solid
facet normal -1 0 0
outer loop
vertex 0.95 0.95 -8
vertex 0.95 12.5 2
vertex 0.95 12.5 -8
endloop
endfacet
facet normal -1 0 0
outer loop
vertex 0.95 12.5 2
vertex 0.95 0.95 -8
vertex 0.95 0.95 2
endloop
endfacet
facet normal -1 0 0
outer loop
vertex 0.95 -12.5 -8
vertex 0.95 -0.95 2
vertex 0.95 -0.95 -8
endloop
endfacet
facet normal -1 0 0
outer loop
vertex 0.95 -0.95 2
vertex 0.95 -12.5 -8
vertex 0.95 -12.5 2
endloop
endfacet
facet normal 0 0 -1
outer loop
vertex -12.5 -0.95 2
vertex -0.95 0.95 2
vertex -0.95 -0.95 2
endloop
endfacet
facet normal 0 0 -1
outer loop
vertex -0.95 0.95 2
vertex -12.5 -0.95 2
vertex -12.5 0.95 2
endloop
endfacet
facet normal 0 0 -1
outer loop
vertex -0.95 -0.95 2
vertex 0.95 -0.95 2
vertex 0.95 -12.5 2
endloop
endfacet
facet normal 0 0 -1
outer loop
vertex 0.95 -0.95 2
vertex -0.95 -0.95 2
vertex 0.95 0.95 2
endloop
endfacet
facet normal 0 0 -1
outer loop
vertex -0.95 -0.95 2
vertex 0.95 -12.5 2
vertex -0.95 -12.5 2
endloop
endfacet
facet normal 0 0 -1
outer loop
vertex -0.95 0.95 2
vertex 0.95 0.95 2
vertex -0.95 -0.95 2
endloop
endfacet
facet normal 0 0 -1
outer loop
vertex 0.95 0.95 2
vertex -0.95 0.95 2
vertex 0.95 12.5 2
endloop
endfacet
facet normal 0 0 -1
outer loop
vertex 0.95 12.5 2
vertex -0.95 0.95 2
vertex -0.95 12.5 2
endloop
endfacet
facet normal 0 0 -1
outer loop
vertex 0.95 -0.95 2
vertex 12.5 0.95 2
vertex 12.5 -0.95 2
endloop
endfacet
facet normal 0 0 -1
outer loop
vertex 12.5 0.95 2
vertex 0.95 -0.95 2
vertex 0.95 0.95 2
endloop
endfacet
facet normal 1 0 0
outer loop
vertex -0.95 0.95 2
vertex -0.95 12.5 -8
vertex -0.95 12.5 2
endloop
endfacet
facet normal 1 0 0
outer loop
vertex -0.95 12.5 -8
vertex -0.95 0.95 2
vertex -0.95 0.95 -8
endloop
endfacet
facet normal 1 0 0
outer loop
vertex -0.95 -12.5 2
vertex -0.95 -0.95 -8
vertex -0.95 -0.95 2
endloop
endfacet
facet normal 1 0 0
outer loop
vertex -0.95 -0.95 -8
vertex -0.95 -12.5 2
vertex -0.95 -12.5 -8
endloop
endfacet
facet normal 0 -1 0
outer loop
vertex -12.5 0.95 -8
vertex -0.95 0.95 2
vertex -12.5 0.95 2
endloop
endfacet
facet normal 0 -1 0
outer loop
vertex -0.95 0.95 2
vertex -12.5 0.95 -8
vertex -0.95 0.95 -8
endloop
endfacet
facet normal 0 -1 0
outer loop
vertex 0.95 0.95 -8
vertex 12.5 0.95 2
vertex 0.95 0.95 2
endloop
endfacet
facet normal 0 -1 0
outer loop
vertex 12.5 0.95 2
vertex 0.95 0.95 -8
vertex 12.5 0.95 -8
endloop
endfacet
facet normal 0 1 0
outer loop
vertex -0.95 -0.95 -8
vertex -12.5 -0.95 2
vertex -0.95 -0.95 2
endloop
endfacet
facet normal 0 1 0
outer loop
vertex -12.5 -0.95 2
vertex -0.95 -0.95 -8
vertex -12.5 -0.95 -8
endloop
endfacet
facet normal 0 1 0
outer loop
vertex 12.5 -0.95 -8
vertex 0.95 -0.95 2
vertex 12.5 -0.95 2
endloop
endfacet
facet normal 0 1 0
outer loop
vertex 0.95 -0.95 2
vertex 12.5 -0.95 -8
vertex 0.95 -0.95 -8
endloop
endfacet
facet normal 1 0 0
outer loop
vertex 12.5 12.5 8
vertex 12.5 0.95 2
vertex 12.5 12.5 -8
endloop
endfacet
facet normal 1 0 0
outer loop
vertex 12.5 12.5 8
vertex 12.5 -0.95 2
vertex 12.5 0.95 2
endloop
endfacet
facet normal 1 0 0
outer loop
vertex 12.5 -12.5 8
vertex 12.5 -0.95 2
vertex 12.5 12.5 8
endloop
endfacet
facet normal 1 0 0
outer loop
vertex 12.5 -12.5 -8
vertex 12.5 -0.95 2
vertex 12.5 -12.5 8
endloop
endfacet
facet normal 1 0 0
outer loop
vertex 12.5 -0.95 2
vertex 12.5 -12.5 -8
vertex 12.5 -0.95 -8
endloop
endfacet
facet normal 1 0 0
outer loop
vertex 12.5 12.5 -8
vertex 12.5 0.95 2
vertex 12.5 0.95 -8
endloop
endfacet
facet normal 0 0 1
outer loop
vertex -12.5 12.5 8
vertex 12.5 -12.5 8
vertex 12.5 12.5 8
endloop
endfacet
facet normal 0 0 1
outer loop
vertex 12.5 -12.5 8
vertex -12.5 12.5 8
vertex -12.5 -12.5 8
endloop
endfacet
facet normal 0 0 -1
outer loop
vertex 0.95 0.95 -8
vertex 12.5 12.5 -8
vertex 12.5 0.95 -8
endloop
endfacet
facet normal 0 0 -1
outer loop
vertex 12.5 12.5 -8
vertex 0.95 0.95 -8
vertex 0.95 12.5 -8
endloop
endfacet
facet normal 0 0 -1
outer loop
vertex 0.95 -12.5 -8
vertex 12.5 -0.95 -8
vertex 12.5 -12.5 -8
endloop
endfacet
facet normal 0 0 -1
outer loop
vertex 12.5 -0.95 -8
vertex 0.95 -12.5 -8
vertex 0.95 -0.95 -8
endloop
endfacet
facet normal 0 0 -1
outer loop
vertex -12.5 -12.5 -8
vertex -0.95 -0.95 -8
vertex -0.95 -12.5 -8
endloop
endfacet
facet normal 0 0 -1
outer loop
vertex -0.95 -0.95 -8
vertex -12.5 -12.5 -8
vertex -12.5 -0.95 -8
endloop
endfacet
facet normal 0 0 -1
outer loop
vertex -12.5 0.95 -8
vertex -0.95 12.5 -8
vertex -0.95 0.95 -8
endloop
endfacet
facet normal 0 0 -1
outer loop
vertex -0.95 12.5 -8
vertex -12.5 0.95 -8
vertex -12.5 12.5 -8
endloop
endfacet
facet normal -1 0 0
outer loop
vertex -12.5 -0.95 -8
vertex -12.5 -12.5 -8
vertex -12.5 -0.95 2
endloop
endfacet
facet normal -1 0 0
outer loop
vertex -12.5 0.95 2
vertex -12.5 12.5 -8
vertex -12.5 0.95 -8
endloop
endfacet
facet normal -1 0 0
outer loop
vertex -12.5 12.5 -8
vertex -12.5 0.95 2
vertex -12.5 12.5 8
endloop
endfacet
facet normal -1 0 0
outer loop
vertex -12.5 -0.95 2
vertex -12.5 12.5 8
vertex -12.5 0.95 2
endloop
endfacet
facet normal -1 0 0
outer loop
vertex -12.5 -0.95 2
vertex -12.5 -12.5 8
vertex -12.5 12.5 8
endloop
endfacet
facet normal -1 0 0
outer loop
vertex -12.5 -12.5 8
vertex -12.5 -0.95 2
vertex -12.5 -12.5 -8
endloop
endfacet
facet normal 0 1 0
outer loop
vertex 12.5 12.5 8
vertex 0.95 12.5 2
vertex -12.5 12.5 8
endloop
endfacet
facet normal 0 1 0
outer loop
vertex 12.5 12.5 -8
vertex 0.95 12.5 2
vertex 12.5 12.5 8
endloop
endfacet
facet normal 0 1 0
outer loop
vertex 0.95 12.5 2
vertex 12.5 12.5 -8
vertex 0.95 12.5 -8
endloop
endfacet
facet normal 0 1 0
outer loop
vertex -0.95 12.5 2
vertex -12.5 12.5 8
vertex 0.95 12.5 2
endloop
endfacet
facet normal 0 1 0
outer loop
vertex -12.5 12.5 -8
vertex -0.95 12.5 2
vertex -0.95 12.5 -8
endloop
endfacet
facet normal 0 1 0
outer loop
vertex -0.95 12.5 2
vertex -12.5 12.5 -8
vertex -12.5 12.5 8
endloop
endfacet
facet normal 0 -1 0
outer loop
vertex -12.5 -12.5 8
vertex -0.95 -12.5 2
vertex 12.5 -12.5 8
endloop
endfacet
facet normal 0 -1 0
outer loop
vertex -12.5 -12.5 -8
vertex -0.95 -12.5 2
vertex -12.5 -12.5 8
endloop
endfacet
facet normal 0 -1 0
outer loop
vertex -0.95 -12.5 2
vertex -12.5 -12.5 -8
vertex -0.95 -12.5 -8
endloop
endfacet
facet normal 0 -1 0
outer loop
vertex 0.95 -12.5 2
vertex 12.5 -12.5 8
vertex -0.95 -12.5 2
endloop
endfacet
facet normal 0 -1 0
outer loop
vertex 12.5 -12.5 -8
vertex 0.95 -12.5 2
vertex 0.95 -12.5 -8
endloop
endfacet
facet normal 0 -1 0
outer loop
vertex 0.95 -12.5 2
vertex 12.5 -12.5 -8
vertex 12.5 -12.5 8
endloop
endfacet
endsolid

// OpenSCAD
/*
Držák na mobil IKEA style skládací
*/

module fixer(){
    difference(){
        cube(size=[25,25,16], center=true);
        translate([0,0,-6]) union(){
            color("Red") cube(size=[1.9,26,16], center=true);
            color("Red") cube(size=[26,1.9,16], center=true);
            }//union
        }//diff
    }//module
    
module short_part(width=85, length=120, hole=3.5){
    difference(){
        color("Blue", alpha=1) translate([0,0,0]) cube(size=[85,length,2], center=false);
        color("Red", alpha=1) translate([-0.1,30,-1]) cube(size=[0.5*width,hole,5], center=false);
    }//diff
    }//module


module long_part(width=85, length=210){
    
        short_part(width, length,4);
        
        translate([0,0,17]) rotate([-15,0,0])union(){
        color("Green", alpha=1) translate([5,55,0]) cube(size=[30,3,20], center=false);
        color("Green", alpha=1) translate([width-30-5,55,0]) cube(size=[30,3,20], center=false);
        }//union
    


    }//module
    
//translate ([-90,0,0]) short_part();
//long_part();
fixer();
